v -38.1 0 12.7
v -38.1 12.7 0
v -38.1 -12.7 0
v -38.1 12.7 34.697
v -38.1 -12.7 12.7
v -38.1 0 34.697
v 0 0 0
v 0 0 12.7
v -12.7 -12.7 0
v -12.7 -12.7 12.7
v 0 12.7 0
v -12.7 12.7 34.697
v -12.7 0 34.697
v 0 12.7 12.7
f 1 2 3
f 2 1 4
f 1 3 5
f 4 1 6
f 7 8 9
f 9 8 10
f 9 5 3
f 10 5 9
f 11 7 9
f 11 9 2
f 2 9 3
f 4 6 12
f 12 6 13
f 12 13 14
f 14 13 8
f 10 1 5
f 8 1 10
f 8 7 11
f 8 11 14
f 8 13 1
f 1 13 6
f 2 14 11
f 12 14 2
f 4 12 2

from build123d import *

# Parameters (mm, degrees)
F0_W     = 38.1
F0_H     = 12.7
F1_DEPTH = 12.7
F3_DEPTH = 25.4
F4_W     = 38.1
F4_H     = 12.7
F5_DEPTH = 12.7


with BuildPart() as f1:
    # F0 (on Front) → F1 (new body)
    with BuildSketch(Plane.XZ):
        with Locations((-19.05, 6.35)):
            Rectangle(F0_W, F0_H)
    extrude(amount=F1_DEPTH)

    # F2 (on face) → F3 (cut)
    with BuildSketch(Plane.XY.offset(12.7)):
        Polygon((0, -12.7), (0, 0), (-12.7, -12.7), align=None)
    extrude(amount=-F3_DEPTH, mode=Mode.SUBTRACT)

    # F4 (on face) → F5 (join)
    with BuildSketch(Plane(origin=(0, 0, 0), x_dir=(-1, 0, 0), z_dir=(0, 1, 0))):
        with Locations((19.05, 6.35)):
            Rectangle(F4_W, F4_H)
        Polygon((0, 12.7), (38.1, 12.7), (38.1, 34.697045), (12.7, 34.697045), align=None)
    extrude(amount=F5_DEPTH)


solid = f1.part
